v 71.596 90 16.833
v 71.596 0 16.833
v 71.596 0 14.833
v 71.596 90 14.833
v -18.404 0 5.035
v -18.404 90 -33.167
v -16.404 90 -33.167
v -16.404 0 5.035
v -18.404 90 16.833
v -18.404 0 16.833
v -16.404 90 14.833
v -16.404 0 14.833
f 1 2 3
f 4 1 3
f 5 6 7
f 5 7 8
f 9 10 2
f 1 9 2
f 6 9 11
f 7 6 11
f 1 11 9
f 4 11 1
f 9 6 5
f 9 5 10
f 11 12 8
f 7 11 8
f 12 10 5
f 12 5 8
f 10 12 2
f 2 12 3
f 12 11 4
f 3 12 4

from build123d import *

# Parameters (mm, degrees)
SKETCH1_W           = 2
SKETCH1_H           = 48
SKETCH1_H_2         = 2
SKETCH1_W_2         = 88
BOSS_EXTRUDE1_DEPTH = 90
CUT_EXTRUDE1_REACH  = 133.53


with BuildPart() as part:
    # Sketch1 → Boss-Extrude1 (new body)
    with BuildSketch(Plane(origin=(0, 0, 0), x_dir=(1, 0, 0), z_dir=(0, 1, 0))):
        with Locations((-17.403694266, 9.167350329)):
            Rectangle(SKETCH1_W, SKETCH1_H)
        with Locations((-17.403694266, -15.832649671)):
            Rectangle(SKETCH1_W, SKETCH1_H_2)
        with Locations((27.596305734, -15.832649671)):
            Rectangle(SKETCH1_W_2, SKETCH1_H_2)
    extrude(amount=BOSS_EXTRUDE1_DEPTH)

    # Sketch2 → Cut-Extrude1 (cut, up to next)
    with BuildSketch(Plane.ZY.offset(18.403694266), mode=Mode.PRIVATE) as cut_extrude1_sk1:
        Polygon((-33.167350329, 90), (5.03538313, 0), (-33.167350329, 0), align=None)
    cut_extrude1_tool1 = extrude(cut_extrude1_sk1.sketch, amount=-CUT_EXTRUDE1_REACH, mode=Mode.PRIVATE) & part.part
    add(cut_extrude1_tool1.solids().sort_by_distance((-18.403694, 30, -20.433106))[0], mode=Mode.SUBTRACT)


solid = part.part
